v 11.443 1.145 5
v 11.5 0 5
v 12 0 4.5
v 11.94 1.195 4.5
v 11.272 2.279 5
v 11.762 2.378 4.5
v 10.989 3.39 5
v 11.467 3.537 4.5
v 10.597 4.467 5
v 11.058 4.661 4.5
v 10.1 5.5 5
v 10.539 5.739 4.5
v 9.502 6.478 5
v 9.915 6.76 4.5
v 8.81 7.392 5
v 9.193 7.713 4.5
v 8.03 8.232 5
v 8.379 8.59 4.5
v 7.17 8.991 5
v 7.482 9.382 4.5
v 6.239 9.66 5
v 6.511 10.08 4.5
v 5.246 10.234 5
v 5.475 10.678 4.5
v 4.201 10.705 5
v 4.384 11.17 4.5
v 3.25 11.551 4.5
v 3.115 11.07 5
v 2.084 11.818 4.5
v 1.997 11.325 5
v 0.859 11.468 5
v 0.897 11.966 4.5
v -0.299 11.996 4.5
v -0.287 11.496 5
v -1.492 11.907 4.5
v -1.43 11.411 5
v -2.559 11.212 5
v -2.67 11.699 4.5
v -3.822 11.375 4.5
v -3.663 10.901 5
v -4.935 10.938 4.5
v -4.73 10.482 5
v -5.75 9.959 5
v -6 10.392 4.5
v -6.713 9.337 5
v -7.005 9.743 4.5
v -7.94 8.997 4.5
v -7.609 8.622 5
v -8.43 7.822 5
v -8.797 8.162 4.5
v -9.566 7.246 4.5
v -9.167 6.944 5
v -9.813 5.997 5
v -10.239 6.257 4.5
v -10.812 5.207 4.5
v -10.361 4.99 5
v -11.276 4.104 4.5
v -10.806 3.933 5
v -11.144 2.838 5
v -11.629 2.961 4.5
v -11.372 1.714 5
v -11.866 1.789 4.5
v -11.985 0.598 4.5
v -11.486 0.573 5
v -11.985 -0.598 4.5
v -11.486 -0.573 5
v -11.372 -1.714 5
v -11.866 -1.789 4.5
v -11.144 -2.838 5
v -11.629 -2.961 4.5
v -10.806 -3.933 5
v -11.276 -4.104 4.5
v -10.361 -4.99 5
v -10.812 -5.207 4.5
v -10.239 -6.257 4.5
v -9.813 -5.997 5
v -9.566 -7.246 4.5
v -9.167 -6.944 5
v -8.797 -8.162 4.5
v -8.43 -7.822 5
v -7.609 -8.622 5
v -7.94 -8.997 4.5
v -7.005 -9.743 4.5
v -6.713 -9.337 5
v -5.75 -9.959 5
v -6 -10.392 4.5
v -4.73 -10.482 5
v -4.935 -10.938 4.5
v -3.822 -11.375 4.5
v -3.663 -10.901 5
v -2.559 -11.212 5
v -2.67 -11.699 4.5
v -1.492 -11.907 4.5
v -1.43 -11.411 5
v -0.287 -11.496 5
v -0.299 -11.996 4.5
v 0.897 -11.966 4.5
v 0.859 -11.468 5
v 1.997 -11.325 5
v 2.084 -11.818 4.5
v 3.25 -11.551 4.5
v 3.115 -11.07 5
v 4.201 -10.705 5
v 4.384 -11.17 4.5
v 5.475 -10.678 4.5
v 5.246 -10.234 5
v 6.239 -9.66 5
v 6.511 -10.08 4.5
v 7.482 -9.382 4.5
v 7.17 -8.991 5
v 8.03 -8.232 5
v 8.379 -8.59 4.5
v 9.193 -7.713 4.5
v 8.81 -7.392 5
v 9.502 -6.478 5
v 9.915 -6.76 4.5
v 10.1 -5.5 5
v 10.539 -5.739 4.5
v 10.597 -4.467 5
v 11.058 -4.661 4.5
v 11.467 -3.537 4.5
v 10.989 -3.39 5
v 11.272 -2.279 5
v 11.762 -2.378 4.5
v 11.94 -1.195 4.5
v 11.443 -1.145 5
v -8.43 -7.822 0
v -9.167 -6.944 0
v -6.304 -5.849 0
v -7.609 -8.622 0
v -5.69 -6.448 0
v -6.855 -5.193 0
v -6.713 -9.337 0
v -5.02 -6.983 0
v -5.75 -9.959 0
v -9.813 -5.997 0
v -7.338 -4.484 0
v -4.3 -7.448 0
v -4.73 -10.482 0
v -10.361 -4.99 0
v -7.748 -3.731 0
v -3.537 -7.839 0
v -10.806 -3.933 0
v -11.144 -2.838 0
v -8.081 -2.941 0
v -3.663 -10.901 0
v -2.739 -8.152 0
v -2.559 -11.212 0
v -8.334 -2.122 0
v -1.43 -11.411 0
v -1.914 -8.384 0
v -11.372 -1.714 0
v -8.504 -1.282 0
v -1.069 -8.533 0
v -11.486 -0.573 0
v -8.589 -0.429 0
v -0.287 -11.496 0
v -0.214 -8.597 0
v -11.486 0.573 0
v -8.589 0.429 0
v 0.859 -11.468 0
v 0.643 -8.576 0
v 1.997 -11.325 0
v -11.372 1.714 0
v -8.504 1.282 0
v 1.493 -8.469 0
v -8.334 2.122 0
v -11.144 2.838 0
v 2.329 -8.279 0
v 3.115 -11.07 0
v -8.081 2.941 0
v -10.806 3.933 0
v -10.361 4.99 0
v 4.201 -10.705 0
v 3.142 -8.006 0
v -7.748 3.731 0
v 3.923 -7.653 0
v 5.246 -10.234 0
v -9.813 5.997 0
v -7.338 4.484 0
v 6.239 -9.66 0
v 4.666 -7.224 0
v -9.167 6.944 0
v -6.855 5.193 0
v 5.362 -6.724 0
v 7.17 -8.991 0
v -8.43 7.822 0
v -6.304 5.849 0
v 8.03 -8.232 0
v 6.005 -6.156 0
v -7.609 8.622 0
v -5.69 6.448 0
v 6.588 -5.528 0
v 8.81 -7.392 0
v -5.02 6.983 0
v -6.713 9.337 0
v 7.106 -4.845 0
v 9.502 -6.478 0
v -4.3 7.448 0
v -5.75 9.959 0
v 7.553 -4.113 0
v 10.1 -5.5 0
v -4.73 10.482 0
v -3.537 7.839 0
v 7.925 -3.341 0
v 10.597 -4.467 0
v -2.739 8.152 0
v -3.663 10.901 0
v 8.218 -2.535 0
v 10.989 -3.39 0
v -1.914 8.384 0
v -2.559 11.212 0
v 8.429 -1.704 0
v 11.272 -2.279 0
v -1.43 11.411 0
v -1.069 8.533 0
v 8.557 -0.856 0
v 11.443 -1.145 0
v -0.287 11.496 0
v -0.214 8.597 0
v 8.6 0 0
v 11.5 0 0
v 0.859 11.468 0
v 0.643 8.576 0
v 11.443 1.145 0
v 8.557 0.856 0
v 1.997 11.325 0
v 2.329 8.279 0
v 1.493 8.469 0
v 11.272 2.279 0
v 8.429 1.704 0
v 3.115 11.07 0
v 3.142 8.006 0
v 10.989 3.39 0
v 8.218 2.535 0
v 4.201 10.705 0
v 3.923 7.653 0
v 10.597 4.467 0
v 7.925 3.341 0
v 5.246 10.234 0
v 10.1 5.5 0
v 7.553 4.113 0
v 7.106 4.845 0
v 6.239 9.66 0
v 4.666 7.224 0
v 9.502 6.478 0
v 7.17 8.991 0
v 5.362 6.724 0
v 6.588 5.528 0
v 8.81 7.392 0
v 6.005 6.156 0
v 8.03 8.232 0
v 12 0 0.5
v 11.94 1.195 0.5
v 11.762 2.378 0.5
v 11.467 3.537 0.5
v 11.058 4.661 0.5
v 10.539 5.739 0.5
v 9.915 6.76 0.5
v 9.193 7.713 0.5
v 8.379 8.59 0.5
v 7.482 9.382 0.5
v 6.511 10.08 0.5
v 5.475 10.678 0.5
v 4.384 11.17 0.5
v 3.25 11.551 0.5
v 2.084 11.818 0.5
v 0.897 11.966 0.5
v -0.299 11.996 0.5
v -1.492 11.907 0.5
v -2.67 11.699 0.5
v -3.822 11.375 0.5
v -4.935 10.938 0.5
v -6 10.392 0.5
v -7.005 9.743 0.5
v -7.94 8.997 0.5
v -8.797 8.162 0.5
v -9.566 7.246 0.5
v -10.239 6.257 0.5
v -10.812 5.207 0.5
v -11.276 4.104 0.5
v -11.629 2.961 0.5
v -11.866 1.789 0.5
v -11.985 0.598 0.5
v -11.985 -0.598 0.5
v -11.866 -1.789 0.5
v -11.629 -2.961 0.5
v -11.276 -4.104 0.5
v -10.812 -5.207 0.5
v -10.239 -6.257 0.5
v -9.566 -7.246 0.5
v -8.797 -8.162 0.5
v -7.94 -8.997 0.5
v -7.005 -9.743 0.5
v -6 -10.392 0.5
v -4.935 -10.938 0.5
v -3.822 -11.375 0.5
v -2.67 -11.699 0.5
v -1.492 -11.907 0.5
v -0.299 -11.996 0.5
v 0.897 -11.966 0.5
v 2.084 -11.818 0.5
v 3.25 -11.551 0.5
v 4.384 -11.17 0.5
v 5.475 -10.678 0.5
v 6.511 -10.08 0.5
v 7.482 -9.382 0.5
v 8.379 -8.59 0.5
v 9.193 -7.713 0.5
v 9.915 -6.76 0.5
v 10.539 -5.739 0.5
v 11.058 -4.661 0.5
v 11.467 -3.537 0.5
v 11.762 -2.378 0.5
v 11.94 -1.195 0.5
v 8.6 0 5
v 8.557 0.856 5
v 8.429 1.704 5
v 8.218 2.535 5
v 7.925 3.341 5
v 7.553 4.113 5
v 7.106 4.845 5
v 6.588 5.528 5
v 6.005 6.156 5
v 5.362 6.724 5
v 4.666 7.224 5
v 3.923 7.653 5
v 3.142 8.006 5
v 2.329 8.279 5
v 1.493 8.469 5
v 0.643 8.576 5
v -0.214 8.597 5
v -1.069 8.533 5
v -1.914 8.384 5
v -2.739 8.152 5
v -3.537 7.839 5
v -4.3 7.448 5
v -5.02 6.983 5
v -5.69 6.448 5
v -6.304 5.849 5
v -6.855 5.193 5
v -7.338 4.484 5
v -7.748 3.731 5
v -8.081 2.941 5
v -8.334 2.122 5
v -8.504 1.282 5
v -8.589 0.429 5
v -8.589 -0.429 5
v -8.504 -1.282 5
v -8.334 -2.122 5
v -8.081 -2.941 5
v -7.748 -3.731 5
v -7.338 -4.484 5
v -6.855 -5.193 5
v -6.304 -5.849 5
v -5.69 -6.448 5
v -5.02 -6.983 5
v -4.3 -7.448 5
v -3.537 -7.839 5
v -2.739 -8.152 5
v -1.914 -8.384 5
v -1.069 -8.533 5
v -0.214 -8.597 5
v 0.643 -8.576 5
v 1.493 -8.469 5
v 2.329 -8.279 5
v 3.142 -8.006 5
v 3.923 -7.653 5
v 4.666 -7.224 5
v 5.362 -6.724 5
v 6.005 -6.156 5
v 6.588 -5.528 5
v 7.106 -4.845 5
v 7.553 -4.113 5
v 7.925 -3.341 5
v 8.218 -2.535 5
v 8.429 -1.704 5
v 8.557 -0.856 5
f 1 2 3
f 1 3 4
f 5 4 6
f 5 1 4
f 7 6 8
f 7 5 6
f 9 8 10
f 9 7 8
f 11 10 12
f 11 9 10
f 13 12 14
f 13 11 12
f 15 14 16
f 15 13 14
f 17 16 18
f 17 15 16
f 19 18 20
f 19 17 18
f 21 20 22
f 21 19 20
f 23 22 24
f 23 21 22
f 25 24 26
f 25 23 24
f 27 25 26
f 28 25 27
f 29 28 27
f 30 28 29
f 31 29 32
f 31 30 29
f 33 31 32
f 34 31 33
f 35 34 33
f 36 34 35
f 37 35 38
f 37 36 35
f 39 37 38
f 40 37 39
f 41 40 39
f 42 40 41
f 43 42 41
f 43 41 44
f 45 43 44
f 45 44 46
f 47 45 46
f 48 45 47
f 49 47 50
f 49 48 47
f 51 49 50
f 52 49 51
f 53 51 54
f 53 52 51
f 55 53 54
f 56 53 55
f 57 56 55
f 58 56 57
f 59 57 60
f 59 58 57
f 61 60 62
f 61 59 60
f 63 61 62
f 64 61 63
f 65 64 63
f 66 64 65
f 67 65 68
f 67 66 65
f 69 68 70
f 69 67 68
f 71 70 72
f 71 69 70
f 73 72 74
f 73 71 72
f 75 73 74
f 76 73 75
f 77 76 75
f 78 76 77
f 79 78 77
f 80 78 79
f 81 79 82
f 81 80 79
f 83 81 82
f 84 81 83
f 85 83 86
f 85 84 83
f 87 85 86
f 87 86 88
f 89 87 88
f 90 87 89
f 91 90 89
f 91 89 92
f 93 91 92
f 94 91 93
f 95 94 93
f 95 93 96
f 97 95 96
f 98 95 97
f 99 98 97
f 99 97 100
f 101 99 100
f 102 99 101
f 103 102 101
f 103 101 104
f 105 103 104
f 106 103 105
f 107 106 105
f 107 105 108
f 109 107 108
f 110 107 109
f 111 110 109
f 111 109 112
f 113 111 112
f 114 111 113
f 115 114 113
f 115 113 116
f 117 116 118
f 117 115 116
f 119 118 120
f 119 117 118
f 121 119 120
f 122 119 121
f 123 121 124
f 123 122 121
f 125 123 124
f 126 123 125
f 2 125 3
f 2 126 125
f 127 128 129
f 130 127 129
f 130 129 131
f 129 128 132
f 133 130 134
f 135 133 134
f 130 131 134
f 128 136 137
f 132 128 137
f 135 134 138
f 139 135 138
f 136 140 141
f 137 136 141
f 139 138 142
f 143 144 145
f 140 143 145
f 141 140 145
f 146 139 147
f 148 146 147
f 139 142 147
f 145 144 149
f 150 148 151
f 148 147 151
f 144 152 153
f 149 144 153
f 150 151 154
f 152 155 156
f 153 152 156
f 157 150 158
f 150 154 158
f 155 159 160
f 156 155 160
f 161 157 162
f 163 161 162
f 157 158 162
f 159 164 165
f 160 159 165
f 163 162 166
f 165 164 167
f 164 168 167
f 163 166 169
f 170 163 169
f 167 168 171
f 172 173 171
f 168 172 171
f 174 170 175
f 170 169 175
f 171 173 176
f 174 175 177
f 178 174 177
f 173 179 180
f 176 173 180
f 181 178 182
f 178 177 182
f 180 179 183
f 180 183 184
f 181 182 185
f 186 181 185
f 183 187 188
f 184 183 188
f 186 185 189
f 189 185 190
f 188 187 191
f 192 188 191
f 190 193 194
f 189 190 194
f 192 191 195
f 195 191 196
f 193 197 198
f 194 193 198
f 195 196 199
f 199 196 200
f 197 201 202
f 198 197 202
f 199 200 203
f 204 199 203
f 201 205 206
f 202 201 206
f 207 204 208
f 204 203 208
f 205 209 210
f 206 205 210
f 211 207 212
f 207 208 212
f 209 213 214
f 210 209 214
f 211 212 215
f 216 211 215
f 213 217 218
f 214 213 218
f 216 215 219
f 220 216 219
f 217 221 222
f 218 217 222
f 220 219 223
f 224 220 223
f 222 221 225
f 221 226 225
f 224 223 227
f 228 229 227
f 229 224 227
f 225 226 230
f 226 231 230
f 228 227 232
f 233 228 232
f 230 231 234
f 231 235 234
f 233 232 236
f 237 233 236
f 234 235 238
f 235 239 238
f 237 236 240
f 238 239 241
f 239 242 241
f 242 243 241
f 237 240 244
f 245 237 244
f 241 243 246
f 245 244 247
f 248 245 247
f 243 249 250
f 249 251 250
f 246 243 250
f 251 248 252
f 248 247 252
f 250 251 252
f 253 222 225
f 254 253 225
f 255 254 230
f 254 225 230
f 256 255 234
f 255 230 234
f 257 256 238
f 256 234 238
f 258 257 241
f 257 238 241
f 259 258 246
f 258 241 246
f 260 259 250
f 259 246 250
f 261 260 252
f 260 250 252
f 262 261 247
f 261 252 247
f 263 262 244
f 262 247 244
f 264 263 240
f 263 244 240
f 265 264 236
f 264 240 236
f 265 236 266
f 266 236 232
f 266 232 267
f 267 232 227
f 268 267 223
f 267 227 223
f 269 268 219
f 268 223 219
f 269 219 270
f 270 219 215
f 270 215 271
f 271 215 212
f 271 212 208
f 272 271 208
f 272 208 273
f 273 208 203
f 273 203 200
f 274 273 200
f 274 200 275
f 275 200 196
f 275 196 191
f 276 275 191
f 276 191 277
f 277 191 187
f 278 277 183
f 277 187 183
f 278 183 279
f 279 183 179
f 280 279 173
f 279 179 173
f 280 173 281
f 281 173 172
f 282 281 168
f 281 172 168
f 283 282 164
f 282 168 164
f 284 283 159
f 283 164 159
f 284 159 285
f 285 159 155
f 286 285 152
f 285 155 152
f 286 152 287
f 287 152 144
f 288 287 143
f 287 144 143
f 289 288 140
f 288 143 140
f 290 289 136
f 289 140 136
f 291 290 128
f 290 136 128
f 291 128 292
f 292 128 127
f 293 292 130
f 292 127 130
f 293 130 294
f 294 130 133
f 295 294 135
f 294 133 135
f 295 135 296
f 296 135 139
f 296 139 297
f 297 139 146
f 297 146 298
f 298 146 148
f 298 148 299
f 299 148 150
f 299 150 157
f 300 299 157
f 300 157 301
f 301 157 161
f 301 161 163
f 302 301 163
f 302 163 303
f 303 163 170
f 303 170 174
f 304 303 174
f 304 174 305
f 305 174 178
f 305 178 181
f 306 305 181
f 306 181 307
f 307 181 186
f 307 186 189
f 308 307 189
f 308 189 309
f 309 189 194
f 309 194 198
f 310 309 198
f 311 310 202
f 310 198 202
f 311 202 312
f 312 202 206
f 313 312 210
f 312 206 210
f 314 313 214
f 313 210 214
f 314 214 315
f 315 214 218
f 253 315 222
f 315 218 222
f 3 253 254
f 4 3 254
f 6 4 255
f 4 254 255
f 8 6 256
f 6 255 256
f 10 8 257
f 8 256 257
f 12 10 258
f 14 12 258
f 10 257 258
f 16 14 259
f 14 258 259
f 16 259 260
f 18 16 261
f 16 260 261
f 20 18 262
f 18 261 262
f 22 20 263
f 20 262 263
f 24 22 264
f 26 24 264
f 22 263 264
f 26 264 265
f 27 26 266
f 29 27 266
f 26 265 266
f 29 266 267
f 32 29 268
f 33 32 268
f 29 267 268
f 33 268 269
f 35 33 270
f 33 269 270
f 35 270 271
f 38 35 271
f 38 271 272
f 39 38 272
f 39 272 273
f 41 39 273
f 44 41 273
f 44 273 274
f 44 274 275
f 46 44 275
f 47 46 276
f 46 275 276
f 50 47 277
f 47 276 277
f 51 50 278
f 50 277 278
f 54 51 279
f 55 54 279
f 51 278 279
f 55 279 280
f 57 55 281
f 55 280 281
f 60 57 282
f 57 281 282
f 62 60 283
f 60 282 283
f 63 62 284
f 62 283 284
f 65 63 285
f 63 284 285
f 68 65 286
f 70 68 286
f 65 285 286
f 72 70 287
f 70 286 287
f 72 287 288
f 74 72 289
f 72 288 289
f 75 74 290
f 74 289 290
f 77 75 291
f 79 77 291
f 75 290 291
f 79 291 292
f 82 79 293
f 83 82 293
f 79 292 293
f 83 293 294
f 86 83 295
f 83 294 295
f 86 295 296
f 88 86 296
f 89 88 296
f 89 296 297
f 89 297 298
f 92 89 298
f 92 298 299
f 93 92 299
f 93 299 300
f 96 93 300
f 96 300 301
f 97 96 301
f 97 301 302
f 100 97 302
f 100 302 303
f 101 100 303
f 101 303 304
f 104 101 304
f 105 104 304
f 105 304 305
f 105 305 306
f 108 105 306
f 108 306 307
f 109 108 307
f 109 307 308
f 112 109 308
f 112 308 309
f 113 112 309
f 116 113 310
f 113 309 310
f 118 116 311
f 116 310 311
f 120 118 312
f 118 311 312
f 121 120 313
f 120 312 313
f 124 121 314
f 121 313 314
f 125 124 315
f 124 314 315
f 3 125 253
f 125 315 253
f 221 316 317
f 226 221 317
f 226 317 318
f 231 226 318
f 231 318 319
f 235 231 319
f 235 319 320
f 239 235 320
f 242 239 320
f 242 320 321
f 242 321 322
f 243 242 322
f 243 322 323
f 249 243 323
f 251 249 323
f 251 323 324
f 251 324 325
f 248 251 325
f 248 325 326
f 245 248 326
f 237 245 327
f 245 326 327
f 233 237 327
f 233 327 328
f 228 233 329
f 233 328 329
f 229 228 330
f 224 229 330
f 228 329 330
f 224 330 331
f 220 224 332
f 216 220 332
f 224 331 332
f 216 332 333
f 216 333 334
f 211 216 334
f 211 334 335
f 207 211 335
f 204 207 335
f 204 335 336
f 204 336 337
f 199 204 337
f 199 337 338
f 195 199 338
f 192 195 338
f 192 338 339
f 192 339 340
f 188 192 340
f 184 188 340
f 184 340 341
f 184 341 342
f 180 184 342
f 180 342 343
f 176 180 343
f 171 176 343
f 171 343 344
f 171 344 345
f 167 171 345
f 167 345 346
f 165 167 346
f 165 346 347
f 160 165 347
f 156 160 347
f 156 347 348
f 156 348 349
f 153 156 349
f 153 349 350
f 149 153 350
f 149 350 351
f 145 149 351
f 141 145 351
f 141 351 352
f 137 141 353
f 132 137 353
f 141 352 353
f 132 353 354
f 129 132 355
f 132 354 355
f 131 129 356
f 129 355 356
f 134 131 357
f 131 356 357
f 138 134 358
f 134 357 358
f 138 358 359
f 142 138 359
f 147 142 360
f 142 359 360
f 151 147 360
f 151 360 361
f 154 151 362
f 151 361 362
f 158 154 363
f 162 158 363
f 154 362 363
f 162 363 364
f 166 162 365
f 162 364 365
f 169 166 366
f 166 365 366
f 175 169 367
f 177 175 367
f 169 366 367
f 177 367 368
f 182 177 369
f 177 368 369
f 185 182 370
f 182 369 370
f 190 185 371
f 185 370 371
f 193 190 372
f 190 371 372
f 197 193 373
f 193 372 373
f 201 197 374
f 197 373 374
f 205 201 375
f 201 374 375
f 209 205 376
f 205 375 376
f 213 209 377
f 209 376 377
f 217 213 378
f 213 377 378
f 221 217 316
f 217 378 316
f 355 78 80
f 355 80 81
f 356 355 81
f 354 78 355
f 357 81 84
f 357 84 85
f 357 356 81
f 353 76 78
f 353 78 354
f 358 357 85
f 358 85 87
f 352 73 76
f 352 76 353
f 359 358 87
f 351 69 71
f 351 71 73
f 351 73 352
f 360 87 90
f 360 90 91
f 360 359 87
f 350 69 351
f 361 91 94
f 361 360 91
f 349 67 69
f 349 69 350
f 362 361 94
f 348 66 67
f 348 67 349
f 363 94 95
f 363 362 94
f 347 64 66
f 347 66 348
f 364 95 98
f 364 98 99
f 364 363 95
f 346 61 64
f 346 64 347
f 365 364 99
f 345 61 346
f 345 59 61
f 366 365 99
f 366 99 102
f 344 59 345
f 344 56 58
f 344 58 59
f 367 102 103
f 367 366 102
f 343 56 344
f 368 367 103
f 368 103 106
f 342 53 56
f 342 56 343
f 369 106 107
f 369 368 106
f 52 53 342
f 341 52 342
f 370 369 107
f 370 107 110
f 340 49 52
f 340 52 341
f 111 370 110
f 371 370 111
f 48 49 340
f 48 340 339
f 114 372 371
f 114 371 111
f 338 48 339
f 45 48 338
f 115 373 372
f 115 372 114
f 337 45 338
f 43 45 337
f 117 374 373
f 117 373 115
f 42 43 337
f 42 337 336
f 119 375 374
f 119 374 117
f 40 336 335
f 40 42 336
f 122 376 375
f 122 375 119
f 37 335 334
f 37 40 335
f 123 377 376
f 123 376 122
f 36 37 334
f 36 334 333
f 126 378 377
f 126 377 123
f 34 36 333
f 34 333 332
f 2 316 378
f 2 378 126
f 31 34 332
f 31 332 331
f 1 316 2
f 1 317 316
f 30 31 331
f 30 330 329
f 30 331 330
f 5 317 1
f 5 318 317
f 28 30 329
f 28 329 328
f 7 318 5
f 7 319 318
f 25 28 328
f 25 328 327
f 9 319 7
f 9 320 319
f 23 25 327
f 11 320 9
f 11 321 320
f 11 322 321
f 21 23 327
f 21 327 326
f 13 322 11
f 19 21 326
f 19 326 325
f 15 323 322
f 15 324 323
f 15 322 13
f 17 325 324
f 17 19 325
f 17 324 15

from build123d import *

# Parameters (mm, degrees)
SCHIZZO1_R                   = 12
ESTRUSIONE_ESTRUSIONE1_DEPTH = 5
SCHIZZO3_R                   = 8.6
TAGLIO_ESTRUSIONE1_DEPTH     = 18.691806013
SMUSSO1_SIZE                 = 0.5
SMUSSO2_SIZE                 = 0.5


with BuildPart() as part:
    # Schizzo1 → Estrusione-Estrusione1 (new body)
    with BuildSketch(Plane.XY):
        Circle(SCHIZZO1_R)
    extrude(amount=ESTRUSIONE_ESTRUSIONE1_DEPTH)

    # Schizzo3 → Taglio-Estrusione1 (cut, through all)
    with BuildSketch(Plane.XY.offset(5)):
        Circle(SCHIZZO3_R)
    extrude(amount=-TAGLIO_ESTRUSIONE1_DEPTH, mode=Mode.SUBTRACT)

    # Smusso1
    smusso1_edges = [part.edges().sort_by_distance(p)[0] for p in [
        (-12, 0, 5),
    ]]
    chamfer(smusso1_edges, length=SMUSSO1_SIZE)

    # Smusso2
    smusso2_edges = [part.edges().sort_by_distance(p)[0] for p in [
        (-12, 0, 0),
    ]]
    chamfer(smusso2_edges, length=SMUSSO2_SIZE)


solid = part.part
